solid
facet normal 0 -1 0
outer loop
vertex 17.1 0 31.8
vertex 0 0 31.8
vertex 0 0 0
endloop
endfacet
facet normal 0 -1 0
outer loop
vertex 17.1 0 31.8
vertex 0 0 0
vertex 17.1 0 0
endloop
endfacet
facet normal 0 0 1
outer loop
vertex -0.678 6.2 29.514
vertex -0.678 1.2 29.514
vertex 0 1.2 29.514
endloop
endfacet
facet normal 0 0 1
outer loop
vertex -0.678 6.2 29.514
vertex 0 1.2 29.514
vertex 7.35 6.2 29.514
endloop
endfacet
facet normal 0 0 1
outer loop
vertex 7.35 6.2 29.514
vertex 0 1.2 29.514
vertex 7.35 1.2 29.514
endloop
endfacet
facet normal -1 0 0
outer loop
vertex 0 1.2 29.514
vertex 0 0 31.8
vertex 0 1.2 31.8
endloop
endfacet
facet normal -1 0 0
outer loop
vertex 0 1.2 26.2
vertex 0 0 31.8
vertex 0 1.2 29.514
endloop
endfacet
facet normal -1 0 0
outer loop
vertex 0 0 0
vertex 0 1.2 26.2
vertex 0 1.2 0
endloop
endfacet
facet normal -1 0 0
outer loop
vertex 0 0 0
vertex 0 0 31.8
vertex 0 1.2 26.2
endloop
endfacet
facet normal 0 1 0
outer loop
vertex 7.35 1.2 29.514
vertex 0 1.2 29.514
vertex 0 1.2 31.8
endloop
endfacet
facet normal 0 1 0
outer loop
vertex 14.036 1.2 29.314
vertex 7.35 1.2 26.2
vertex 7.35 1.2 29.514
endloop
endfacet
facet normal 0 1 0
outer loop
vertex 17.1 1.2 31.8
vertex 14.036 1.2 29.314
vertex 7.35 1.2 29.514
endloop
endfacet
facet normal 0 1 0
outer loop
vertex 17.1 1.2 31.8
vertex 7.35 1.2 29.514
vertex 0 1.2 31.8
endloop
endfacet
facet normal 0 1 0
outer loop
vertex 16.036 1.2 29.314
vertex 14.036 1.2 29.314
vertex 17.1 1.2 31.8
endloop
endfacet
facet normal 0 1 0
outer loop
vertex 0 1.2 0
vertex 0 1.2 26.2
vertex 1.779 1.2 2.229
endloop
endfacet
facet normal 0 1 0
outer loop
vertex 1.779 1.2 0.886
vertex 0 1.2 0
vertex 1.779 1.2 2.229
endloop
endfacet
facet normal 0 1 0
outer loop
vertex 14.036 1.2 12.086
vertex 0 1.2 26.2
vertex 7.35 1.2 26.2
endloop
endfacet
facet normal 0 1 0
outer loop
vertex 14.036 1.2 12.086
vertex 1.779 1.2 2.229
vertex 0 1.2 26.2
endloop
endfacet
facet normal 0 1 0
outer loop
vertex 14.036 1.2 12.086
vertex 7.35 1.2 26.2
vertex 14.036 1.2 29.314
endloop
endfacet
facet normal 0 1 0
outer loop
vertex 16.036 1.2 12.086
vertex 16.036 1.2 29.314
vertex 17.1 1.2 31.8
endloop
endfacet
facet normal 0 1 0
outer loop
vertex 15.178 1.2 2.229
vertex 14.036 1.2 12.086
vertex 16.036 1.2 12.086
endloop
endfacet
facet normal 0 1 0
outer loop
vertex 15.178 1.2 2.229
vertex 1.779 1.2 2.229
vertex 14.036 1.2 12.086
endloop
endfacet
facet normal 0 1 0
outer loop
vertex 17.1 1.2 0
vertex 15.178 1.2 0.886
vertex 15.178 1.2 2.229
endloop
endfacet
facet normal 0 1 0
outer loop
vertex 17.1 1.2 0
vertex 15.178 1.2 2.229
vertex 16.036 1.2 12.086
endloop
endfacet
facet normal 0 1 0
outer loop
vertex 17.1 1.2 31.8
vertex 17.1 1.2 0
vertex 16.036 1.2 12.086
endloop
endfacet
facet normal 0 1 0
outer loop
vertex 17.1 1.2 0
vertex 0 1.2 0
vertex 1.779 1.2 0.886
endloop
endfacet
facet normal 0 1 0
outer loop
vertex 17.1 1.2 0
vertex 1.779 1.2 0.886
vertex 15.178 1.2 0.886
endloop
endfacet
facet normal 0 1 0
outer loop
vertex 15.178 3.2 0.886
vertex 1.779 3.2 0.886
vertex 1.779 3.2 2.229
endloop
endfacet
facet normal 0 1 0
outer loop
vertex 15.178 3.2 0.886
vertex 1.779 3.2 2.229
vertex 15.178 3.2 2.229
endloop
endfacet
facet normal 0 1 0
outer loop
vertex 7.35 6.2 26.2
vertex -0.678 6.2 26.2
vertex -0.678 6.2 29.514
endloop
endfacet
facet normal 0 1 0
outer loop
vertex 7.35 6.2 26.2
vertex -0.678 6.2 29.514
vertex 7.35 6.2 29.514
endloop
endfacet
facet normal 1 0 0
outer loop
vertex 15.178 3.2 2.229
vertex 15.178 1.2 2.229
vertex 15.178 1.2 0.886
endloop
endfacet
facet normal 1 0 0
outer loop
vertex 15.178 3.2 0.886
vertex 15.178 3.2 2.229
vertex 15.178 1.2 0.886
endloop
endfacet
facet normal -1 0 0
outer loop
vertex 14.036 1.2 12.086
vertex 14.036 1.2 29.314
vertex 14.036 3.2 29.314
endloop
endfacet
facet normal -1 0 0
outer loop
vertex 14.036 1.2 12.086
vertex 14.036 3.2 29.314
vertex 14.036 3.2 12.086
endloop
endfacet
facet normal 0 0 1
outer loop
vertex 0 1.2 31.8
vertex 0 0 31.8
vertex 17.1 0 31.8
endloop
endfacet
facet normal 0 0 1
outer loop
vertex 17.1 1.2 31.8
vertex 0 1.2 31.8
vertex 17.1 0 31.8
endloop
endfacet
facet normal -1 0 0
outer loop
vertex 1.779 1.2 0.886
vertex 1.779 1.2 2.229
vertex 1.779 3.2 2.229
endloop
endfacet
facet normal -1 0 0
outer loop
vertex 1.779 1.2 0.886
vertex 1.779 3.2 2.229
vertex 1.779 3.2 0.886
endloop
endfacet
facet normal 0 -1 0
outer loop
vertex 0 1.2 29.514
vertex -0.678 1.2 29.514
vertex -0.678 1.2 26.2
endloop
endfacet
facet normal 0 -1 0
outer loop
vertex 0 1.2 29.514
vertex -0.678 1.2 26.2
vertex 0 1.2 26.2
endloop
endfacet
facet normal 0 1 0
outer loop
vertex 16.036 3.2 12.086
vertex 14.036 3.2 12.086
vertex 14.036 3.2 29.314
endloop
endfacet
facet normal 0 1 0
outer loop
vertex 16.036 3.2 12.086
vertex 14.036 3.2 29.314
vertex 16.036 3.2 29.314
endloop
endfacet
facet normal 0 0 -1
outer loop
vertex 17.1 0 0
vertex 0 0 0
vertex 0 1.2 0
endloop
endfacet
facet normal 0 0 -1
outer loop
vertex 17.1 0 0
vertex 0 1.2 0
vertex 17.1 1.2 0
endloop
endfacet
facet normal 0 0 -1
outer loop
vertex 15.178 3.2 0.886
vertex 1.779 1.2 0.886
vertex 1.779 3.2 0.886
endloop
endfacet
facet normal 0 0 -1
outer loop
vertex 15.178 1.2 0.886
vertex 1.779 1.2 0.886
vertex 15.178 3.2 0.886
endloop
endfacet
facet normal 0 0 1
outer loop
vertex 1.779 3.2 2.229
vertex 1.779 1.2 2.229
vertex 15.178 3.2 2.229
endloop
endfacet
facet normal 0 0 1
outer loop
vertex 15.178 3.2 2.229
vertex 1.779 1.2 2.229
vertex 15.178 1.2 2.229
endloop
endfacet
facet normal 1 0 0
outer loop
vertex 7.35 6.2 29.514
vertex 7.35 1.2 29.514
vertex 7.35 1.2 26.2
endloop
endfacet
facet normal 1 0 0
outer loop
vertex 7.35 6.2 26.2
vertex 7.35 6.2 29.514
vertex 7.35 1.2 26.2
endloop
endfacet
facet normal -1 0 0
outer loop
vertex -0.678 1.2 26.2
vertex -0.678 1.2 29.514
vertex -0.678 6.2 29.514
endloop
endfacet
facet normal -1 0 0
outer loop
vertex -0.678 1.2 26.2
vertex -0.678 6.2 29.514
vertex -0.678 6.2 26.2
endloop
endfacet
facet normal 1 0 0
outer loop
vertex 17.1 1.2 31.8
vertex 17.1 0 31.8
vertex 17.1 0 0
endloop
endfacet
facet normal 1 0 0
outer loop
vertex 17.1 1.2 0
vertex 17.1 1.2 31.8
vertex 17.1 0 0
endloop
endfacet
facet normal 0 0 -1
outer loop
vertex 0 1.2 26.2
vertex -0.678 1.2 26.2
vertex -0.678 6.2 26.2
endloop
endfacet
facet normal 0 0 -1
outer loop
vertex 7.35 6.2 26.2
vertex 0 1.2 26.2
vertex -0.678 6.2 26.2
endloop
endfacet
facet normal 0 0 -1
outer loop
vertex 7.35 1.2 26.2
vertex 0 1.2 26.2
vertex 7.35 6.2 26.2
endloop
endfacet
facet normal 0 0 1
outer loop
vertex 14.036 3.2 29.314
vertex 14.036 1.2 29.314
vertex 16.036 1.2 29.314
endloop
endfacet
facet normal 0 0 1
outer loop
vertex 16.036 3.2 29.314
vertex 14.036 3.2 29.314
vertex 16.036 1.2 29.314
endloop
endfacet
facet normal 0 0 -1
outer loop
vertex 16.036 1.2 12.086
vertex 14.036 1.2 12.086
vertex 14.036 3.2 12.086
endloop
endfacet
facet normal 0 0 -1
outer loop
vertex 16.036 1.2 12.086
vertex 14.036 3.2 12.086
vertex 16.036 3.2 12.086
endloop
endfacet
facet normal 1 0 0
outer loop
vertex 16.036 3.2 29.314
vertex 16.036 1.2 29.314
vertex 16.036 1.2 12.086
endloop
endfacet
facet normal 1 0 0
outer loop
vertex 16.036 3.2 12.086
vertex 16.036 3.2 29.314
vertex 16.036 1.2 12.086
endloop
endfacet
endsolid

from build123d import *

# Parameters (mm, degrees)
SKETCH1_W           = 17.1
SKETCH1_H           = 31.8
BOSS_EXTRUDE1_DEPTH = 1.2
SKETCH2_W           = 13.399731937
SKETCH2_H           = 1.34283028
SKETCH2_W_2         = 1.999959991
SKETCH2_H_2         = 17.228226777
BOSS_EXTRUDE2_DEPTH = 2
SKETCH3_W           = 8.02841082
SKETCH3_H           = 3.314219413
BOSS_EXTRUDE3_DEPTH = 5


with BuildPart() as part:
    # Sketch1 → Boss-Extrude1 (new body)
    with BuildSketch(Plane(origin=(0, 0, 0), x_dir=(1, 0, 0), z_dir=(0, 1, 0))):
        with Locations((8.55, -15.9)):
            Rectangle(SKETCH1_W, SKETCH1_H)
    extrude(amount=BOSS_EXTRUDE1_DEPTH)

    # Sketch2 → Boss-Extrude2 (add)
    with BuildSketch(Plane(origin=(0, 1.2, 0), x_dir=(1, 0, 0), z_dir=(0, 1, 0))):
        with Locations((8.478572857, -1.557429781)):
            Rectangle(SKETCH2_W, SKETCH2_H)
        with Locations((15.035584542, -20.699903977)):
            Rectangle(SKETCH2_W_2, SKETCH2_H_2)
    extrude(amount=BOSS_EXTRUDE2_DEPTH)

    # Sketch3 → Boss-Extrude3 (add)
    with BuildSketch(Plane(origin=(0, 1.2, 0), x_dir=(1, 0, 0), z_dir=(0, 1, 0))):
        with Locations((3.335818596, -27.856903659)):
            Rectangle(SKETCH3_W, SKETCH3_H)
    extrude(amount=BOSS_EXTRUDE3_DEPTH)


solid = part.part
